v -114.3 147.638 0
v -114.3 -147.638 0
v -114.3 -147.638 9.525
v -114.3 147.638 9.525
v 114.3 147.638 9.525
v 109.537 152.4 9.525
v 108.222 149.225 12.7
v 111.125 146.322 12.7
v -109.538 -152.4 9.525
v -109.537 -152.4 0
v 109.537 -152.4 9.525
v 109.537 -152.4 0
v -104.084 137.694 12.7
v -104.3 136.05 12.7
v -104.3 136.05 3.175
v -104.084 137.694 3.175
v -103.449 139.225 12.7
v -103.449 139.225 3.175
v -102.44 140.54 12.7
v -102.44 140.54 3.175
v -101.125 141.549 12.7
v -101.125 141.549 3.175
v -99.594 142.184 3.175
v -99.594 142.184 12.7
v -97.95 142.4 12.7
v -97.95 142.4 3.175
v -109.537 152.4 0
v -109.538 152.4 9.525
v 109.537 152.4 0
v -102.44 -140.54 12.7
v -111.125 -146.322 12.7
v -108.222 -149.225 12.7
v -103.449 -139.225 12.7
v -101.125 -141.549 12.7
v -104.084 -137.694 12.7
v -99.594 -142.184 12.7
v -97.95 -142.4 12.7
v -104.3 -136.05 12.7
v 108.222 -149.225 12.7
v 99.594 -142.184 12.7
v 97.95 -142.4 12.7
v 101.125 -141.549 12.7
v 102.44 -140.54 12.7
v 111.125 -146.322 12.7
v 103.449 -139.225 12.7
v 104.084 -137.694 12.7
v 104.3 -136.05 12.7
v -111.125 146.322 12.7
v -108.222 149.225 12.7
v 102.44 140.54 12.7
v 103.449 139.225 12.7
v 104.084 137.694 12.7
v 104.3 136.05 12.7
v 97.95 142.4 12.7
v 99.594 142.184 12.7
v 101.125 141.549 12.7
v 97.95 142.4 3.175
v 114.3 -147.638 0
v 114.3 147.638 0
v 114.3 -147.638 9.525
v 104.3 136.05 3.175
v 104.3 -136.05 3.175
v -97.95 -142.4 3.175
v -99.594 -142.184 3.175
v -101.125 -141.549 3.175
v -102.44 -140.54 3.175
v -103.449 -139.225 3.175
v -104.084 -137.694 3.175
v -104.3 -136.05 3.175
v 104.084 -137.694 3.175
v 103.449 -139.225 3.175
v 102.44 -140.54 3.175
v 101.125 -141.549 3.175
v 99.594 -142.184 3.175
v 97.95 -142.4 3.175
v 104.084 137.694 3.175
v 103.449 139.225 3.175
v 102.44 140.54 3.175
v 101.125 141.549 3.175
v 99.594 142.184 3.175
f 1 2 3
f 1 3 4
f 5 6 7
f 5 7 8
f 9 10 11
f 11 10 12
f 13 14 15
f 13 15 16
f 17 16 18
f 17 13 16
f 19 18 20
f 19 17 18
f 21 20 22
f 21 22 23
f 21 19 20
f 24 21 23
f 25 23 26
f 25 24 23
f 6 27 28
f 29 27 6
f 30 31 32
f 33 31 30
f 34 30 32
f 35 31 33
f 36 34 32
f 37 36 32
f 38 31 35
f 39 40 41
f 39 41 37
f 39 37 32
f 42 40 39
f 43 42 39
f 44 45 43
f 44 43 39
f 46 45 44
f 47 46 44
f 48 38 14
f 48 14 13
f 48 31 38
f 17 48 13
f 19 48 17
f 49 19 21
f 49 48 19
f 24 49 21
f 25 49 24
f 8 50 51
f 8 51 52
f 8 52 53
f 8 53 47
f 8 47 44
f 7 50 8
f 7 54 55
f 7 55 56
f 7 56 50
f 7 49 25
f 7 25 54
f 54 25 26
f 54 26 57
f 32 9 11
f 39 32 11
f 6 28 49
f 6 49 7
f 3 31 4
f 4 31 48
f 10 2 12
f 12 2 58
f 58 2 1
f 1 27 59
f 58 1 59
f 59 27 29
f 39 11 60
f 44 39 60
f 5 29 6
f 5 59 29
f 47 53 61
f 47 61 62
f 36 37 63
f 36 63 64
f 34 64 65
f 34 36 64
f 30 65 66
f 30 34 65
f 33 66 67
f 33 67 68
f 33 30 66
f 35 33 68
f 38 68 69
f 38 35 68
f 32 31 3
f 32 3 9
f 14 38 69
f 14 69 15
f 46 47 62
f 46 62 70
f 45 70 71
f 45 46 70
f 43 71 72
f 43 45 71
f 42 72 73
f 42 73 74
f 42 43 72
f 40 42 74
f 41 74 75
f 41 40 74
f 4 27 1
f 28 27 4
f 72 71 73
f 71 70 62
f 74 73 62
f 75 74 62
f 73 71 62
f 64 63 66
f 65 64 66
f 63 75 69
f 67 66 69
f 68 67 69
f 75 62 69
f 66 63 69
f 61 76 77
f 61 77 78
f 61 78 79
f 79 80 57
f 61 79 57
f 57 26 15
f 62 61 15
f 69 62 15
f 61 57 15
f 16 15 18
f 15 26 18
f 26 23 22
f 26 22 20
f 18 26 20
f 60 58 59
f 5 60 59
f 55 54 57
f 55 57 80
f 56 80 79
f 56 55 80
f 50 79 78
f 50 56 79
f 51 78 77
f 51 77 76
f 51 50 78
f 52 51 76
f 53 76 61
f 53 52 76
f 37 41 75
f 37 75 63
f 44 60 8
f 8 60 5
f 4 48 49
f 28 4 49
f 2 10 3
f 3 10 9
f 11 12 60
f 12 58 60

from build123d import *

# Parameters (mm, degrees)
SKETCH1_W           = 228.6
SKETCH1_H           = 304.8
BOSS_EXTRUDE1_DEPTH = 12.7
CUT_EXTRUDE1_DEPTH  = 9.525
CHAMFER1_SIZE       = 4.7625
CHAMFER2_SIZE       = 3.175


with BuildPart() as part:
    # Sketch1 → Boss-Extrude1 (new body)
    with BuildSketch(Plane.XY):
        Rectangle(SKETCH1_W, SKETCH1_H)
    extrude(amount=BOSS_EXTRUDE1_DEPTH)

    # Sketch2 → Cut-Extrude1 (cut)
    with BuildSketch(Plane.XY.offset(12.7)):
        with BuildLine():
            Line((97.95, -142.4), (-97.95, -142.4))
            ThreePointArc((-97.95, -142.4), (-102.440128061, -140.540128061), (-104.3, -136.05))
            Line((-104.3, -136.05), (-104.3, 136.05))
            ThreePointArc((-104.3, 136.05), (-102.440128061, 140.540128061), (-97.95, 142.4))
            Line((-97.95, 142.4), (97.95, 142.4))
            ThreePointArc((97.95, 142.4), (102.440128061, 140.540128061), (104.3, 136.05))
            Line((104.3, 136.05), (104.3, -136.05))
            ThreePointArc((104.3, -136.05), (102.440128061, -140.540128061), (97.95, -142.4))
        make_face()
    extrude(amount=-CUT_EXTRUDE1_DEPTH, mode=Mode.SUBTRACT)

    # Chamfer1
    chamfer1_edges = [part.edges().sort_by_distance(p)[0] for p in [
        (-114.3, 152.4, 6.35),
        (114.3, 152.4, 6.35),
        (114.3, -152.4, 6.35),
        (-114.3, -152.4, 6.35),
    ]]
    chamfer(chamfer1_edges, length=CHAMFER1_SIZE)

    # Chamfer2
    chamfer2_edges = [part.edges().sort_by_distance(p)[0] for p in [
        (0, -152.4, 12.7),
        (-114.3, 0, 12.7),
        (114.3, 0, 12.7),
        (0, 152.4, 12.7),
        (111.91875, 150.01875, 12.7),
        (-111.91875, 150.01875, 12.7),
        (111.91875, -150.01875, 12.7),
        (-111.91875, -150.01875, 12.7),
    ]]
    chamfer(chamfer2_edges, length=CHAMFER2_SIZE)


solid = part.part
